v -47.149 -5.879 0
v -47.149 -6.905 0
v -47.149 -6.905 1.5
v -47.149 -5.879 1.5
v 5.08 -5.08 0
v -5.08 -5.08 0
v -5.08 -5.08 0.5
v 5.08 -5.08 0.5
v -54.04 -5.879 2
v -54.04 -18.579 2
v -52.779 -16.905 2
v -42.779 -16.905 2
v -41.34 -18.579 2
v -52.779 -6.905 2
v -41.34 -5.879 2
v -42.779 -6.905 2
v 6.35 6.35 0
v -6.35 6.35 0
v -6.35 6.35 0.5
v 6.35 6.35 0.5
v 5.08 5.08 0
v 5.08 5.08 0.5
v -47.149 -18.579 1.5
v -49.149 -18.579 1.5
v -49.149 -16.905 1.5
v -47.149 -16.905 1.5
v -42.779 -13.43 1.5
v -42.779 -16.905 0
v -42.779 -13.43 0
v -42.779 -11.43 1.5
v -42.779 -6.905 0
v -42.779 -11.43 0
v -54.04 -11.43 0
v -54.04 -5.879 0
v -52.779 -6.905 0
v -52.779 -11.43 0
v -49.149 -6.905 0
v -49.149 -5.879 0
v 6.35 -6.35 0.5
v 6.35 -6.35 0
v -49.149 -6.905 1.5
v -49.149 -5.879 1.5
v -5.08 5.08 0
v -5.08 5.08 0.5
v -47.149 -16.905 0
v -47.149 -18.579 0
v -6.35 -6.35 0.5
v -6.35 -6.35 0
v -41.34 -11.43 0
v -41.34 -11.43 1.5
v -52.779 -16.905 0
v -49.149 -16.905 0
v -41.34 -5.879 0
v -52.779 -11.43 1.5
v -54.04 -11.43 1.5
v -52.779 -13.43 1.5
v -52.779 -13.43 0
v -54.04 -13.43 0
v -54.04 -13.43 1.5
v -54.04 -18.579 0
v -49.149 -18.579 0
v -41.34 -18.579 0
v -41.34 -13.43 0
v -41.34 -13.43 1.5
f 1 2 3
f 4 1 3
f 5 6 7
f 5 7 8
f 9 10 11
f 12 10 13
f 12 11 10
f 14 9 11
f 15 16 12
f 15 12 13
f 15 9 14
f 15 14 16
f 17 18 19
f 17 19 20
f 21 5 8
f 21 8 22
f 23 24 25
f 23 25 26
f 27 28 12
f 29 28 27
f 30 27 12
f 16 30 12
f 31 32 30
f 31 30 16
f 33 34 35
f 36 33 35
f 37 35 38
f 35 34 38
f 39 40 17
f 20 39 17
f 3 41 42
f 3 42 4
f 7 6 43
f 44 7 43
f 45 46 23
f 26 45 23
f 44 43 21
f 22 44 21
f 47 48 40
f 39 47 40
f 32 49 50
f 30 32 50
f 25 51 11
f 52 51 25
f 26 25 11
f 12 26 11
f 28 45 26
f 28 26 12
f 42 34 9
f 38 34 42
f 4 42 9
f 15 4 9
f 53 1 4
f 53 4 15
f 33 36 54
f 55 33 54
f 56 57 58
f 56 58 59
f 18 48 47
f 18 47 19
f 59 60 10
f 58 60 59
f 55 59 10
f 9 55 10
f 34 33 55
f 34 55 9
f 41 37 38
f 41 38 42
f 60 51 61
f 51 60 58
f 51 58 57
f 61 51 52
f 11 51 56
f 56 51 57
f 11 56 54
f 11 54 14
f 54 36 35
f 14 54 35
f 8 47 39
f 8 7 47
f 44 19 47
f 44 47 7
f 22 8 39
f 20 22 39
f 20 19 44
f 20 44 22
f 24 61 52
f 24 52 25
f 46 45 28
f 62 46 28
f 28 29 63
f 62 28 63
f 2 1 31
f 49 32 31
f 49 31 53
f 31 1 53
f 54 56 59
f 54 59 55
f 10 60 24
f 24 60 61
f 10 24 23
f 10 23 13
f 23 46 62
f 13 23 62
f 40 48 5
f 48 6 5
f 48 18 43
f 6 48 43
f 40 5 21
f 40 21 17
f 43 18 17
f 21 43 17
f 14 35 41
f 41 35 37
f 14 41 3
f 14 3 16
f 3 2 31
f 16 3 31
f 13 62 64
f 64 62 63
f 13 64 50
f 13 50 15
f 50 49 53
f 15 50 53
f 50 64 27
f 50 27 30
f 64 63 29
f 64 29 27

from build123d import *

# Parameters (mm, degrees)
F0_W     = 12.7
F0_H     = 12.7
F0_W_2   = 10.16
F0_H_2   = 10.16
F1_DEPTH = 0.5
F2_W     = 12.7
F2_H     = 12.7
F2_W_2   = 10
F2_H_2   = 10
F3_DEPTH = 2
F4_W     = 2
F4_H     = 1.5
F5_DEPTH = 25
F6_W     = 2
F6_H     = 1.5
F7_DEPTH = 25


with BuildPart() as f1:
    # F0 (on Top) → F1 (new body)
    with BuildSketch(Plane.XY):
        Rectangle(F0_W, F0_H)
        Rectangle(F0_W_2, F0_H_2, mode=Mode.SUBTRACT)
    extrude(amount=F1_DEPTH)


with BuildPart() as f3:
    # F2 (on Top) → F3 (new body)
    with BuildSketch(Plane.XY):
        with Locations((-47.690042, -12.228896)):
            Rectangle(F2_W, F2_H)
        with Locations((-47.778825, -11.904546)):
            Rectangle(F2_W_2, F2_H_2, mode=Mode.SUBTRACT)
    extrude(amount=F3_DEPTH)

    # F4 (on face) → F5 (cut)
    with BuildSketch(Plane.YZ.offset(-41.340042)):
        with Locations((-12.429796, 0.75)):
            Rectangle(F4_W, F4_H)
    extrude(amount=-F5_DEPTH, mode=Mode.SUBTRACT)

    # F6 (on face) → F7 (cut)
    with BuildSketch(Plane.XZ.offset(18.578896)):
        with Locations((-48.148615, 0.75)):
            Rectangle(F6_W, F6_H)
    extrude(amount=-F7_DEPTH, mode=Mode.SUBTRACT)


solid = Compound([f1.part, f3.part])
